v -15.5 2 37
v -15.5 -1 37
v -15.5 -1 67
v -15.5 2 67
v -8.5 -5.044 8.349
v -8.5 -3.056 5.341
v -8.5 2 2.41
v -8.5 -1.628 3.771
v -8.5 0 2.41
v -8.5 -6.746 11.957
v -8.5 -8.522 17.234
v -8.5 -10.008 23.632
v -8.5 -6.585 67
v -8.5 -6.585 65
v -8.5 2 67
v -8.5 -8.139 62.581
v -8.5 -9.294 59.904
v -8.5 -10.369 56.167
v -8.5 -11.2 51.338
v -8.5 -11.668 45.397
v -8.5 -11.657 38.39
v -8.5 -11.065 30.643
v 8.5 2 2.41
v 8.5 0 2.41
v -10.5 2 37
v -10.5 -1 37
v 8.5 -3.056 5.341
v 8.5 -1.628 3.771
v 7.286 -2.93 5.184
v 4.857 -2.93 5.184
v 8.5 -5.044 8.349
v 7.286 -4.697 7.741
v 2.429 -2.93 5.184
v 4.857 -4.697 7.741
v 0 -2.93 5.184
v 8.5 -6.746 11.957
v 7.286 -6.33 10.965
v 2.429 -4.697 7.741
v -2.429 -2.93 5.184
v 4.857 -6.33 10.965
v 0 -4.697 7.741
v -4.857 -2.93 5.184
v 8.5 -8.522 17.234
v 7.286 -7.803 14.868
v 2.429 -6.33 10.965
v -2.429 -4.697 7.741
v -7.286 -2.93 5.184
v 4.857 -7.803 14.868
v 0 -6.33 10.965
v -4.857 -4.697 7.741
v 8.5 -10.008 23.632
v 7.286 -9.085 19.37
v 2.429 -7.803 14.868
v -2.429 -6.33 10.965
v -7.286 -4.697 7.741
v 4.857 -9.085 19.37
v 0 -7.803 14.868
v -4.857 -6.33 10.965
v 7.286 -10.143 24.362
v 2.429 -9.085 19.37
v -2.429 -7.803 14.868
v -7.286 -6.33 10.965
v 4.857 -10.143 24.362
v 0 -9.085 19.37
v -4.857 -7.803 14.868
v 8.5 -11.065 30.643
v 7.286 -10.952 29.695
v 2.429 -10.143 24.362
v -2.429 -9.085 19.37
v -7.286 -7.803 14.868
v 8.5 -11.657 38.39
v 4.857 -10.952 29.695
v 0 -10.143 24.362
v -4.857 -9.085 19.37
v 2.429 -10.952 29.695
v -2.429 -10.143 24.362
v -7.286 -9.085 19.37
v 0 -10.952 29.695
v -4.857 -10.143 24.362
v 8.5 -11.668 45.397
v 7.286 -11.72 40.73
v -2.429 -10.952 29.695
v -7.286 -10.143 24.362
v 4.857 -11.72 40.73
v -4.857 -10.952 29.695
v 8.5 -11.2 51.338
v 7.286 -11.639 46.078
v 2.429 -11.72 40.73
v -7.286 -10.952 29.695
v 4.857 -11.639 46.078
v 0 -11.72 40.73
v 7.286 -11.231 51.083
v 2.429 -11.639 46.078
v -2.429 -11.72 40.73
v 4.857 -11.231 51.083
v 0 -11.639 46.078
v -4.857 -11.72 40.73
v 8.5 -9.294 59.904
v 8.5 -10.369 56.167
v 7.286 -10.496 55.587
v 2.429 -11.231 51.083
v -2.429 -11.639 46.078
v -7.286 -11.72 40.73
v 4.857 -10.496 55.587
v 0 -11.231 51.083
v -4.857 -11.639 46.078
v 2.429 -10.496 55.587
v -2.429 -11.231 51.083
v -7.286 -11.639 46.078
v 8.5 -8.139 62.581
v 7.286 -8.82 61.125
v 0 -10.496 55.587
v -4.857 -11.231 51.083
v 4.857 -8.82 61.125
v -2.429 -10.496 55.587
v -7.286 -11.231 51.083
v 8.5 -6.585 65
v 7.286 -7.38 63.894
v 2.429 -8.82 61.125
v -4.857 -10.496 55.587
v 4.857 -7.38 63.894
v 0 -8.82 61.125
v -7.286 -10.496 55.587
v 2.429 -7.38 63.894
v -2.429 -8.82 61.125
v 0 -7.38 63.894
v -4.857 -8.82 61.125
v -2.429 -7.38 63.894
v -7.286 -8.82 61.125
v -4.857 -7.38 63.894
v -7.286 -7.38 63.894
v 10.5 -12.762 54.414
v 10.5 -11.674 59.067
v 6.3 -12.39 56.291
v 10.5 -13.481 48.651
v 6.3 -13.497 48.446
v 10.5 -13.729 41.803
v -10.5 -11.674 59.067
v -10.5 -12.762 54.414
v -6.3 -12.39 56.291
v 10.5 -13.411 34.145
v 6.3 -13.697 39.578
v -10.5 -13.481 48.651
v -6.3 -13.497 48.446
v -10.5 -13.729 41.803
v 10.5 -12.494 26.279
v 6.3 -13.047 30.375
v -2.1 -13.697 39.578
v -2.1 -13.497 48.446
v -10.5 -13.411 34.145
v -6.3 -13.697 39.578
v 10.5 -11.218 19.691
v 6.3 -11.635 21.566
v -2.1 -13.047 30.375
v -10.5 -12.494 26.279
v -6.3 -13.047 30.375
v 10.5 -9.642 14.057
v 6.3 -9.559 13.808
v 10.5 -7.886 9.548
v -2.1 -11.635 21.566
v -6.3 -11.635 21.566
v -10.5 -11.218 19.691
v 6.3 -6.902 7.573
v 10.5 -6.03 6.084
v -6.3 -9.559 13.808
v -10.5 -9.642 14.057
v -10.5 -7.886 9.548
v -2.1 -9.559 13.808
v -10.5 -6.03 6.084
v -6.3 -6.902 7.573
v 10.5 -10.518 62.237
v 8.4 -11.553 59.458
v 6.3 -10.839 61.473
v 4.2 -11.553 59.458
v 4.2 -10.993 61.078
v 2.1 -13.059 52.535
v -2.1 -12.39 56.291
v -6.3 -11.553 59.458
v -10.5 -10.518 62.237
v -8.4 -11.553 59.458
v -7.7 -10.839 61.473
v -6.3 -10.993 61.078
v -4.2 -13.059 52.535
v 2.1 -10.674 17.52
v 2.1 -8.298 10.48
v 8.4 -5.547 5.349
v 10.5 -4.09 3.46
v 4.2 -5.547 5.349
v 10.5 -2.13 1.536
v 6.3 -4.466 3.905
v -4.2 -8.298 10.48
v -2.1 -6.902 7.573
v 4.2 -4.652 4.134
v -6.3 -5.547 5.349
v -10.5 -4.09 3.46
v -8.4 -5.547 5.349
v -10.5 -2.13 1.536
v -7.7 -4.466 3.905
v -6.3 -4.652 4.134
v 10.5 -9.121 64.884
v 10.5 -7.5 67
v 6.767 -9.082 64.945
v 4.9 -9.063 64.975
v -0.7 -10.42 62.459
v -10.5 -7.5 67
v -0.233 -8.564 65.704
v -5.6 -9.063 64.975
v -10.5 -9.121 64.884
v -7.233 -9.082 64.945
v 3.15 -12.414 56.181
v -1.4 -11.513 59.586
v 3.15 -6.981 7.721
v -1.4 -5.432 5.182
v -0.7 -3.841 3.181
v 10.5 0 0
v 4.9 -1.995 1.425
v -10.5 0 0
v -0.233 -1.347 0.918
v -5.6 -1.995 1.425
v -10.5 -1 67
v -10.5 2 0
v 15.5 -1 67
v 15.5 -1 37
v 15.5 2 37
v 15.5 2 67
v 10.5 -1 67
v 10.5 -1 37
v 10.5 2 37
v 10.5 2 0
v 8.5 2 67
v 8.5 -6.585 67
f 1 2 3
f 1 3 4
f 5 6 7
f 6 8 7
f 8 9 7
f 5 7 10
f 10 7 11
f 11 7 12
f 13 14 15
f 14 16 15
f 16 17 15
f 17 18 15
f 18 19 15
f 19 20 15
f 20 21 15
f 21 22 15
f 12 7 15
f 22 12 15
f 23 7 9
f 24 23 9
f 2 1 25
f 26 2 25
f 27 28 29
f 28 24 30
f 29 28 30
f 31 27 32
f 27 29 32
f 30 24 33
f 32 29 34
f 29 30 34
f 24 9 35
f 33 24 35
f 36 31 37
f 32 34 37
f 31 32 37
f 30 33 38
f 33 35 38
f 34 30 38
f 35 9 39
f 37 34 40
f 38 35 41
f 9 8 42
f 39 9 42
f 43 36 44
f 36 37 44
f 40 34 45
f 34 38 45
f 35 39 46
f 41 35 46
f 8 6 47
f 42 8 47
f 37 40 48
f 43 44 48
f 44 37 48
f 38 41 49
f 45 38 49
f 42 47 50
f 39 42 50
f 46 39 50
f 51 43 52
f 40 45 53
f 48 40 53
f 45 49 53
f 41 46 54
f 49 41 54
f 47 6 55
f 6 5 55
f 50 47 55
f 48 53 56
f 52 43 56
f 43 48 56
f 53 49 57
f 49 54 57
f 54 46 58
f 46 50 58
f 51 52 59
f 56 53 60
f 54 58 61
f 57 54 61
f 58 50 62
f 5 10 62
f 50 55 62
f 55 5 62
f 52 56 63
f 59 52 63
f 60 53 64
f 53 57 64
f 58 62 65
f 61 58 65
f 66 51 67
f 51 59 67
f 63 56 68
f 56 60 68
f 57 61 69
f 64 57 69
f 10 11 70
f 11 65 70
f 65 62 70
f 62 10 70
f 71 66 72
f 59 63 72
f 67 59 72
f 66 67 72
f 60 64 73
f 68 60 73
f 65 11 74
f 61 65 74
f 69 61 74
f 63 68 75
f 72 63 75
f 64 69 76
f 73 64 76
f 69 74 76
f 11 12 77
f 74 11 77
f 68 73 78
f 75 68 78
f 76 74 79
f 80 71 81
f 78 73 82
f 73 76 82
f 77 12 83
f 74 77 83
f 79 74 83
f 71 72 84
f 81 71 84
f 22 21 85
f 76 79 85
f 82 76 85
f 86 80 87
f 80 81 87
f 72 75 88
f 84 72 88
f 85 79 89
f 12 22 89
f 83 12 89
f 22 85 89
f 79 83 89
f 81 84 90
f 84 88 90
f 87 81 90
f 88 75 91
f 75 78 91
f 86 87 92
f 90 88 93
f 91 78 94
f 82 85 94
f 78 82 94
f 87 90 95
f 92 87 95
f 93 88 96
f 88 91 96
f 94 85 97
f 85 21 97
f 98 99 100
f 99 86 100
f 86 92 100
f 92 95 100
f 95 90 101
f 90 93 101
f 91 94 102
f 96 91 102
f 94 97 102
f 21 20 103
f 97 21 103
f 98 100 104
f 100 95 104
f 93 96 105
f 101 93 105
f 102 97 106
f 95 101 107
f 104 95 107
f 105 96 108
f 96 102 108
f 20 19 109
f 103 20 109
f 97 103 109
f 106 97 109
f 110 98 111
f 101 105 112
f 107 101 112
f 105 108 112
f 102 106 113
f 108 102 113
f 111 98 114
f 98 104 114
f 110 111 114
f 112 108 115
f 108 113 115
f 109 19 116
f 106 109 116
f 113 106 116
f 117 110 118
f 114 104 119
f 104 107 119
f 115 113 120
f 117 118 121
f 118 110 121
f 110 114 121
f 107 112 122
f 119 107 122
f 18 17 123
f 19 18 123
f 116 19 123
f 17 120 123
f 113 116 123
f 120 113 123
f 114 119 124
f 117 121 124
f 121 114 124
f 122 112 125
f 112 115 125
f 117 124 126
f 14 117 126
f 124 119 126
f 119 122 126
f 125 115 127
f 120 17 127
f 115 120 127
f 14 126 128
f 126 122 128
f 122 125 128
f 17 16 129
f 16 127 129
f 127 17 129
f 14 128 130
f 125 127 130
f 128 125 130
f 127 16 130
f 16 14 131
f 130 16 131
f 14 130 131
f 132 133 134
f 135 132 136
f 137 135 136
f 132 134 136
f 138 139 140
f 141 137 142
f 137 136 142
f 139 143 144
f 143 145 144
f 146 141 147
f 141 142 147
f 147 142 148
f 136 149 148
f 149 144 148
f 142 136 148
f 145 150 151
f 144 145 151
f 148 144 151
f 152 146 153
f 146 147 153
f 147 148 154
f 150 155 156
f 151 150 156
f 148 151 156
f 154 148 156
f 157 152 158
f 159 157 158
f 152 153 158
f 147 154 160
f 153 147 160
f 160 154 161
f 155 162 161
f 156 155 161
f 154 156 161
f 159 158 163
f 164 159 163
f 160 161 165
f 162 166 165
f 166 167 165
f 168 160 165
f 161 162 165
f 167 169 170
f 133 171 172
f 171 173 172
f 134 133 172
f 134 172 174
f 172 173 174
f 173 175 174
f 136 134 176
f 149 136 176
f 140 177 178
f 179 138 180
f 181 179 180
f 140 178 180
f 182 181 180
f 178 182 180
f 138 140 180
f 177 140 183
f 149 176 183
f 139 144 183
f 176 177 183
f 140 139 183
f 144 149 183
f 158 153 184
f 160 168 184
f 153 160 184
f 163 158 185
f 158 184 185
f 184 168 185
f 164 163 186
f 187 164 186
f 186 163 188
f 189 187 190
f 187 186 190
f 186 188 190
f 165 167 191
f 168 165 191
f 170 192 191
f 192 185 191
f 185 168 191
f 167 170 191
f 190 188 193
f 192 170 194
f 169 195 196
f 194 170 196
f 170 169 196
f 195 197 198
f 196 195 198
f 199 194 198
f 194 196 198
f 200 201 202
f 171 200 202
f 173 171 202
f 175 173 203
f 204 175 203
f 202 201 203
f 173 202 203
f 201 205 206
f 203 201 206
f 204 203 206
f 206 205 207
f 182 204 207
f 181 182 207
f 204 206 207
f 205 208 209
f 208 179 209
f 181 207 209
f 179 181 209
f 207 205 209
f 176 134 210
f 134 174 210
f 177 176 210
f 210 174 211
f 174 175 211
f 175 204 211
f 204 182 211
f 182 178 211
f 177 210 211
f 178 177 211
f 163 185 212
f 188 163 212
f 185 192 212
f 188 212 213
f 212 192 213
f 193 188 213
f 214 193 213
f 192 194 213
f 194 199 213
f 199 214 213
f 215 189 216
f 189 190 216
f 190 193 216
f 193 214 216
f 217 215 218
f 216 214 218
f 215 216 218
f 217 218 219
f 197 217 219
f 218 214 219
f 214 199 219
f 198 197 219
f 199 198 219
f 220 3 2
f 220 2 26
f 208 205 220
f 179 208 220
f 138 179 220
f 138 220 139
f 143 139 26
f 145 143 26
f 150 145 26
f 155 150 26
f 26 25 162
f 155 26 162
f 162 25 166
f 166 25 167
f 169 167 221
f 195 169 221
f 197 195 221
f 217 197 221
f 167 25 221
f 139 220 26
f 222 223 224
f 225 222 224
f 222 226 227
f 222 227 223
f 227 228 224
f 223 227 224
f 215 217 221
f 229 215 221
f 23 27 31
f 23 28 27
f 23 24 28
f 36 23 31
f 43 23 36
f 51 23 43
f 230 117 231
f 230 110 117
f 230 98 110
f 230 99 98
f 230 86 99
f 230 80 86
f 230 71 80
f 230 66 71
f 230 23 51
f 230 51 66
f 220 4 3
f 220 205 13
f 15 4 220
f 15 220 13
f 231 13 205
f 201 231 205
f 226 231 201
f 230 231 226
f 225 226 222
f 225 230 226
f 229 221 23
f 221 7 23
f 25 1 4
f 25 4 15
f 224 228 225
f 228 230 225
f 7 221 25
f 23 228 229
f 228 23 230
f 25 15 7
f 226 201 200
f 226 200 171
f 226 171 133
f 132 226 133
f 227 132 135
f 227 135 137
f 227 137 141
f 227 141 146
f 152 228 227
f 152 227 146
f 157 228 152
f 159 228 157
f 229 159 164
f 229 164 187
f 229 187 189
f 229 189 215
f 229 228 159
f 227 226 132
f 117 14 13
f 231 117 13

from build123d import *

# Parameters (mm, degrees)
BASEPIEDEAPPOGGIO_START = -10.5
BASEPIEDEAPPOGGIO_DEPTH = 21
LATOSINISTRO_DEPTH      = 2
SCHIZZO3_W              = 5
SCHIZZO3_H              = 3
ALETTEAGGANCIO_DEPTH    = 30


# Read off the part's stored shape, not the designer's step: BasePiedeAppoggio
with BuildPart() as part:
    # BasePiedeAppoggio outline → BasePiedeAppoggio (new body)
    with BuildSketch(Plane(origin=(0, 0, 0), x_dir=(0, 0, -1), z_dir=(1, 0, 0)).offset(BASEPIEDEAPPOGGIO_START)):
        with BuildLine():
            Line((-67, -6.58541733), (-67, -7.5))
            add(Edge.make_bspline(
                [(-67, -7.5), (-60, -14), (-44, -17), (-14, -13), (-5, -8), (0, 0)],
                knots=[0, 0, 0, 0, 0, 0, 1, 1, 1, 1, 1, 1], degree=5))
            Line((0, 0), (0, 2))
            Line((0, 2), (-2.409917527, 2))
            Line((-2.409917527, 2), (-2.409917527, 0))
            add(Edge.make_bspline(
                [(-2.409917527, 0), (-2.667324323, -0.353402954), (-3.476108464, -1.377540434), (-5.718312008, -3.574118885), (-10.497685703, -6.435761001), (-19.037438877, -9.233820798), (-29.572047533, -11.136431528), (-38.966676556, -11.799385995), (-46.135832891, -11.693755764), (-51.166703498, -11.28631183), (-55.693282116, -10.549034431), (-58.932001396, -9.671882802), (-61.157085706, -8.829738395), (-62.633910182, -8.137838289), (-63.931461685, -7.382278902), (-64.645771008, -6.869387628), (-65, -6.58541733)],
                knots=[0.030225408, 0.030225408, 0.030225408, 0.030225408, 0.061229523, 0.122459046, 0.244918093, 0.367377139, 0.489836186, 0.612295232, 0.673524756, 0.734754279, 0.795983802, 0.857213325, 0.887828087, 0.918442849, 0.94905761, 0.979672372, 0.979672372, 0.979672372, 0.979672372], degree=3))
            Line((-65, -6.58541733), (-67, -6.58541733))
        make_face()
    extrude(amount=BASEPIEDEAPPOGGIO_DEPTH)

    # Schizzo2 → LatoSinistro (add)
    with BuildSketch(Plane.ZY.offset(10.5)):
        with BuildLine():
            Line((67, -7.5), (67, 2))
            Line((67, 2), (0, 2))
            Line((0, 2), (0, 0))
            add(Edge.make_bspline(
                [(67, -7.5), (60, -14), (44, -17), (14, -13), (5, -8), (0, 0)],
                knots=[0, 0, 0, 0, 0, 0, 1, 1, 1, 1, 1, 1], degree=5))
        make_face()
    latosinistro = extrude(amount=-LATOSINISTRO_DEPTH)

    # LatoDestro: LatoSinistro across plane
    add(latosinistro.mirror(Plane(origin=(0, 0, 0), x_dir=(0, 0, 1), z_dir=(1, 0, 0))))

    # Schizzo3 → AletteAggancio (add)
    with BuildSketch(Plane.XY.offset(67)):
        with Locations((-13, 0.5)):
            Rectangle(SCHIZZO3_W, SCHIZZO3_H)
        with Locations((13, 0.5)):
            Rectangle(SCHIZZO3_W, SCHIZZO3_H)
    extrude(amount=-ALETTEAGGANCIO_DEPTH)


solid = part.part
